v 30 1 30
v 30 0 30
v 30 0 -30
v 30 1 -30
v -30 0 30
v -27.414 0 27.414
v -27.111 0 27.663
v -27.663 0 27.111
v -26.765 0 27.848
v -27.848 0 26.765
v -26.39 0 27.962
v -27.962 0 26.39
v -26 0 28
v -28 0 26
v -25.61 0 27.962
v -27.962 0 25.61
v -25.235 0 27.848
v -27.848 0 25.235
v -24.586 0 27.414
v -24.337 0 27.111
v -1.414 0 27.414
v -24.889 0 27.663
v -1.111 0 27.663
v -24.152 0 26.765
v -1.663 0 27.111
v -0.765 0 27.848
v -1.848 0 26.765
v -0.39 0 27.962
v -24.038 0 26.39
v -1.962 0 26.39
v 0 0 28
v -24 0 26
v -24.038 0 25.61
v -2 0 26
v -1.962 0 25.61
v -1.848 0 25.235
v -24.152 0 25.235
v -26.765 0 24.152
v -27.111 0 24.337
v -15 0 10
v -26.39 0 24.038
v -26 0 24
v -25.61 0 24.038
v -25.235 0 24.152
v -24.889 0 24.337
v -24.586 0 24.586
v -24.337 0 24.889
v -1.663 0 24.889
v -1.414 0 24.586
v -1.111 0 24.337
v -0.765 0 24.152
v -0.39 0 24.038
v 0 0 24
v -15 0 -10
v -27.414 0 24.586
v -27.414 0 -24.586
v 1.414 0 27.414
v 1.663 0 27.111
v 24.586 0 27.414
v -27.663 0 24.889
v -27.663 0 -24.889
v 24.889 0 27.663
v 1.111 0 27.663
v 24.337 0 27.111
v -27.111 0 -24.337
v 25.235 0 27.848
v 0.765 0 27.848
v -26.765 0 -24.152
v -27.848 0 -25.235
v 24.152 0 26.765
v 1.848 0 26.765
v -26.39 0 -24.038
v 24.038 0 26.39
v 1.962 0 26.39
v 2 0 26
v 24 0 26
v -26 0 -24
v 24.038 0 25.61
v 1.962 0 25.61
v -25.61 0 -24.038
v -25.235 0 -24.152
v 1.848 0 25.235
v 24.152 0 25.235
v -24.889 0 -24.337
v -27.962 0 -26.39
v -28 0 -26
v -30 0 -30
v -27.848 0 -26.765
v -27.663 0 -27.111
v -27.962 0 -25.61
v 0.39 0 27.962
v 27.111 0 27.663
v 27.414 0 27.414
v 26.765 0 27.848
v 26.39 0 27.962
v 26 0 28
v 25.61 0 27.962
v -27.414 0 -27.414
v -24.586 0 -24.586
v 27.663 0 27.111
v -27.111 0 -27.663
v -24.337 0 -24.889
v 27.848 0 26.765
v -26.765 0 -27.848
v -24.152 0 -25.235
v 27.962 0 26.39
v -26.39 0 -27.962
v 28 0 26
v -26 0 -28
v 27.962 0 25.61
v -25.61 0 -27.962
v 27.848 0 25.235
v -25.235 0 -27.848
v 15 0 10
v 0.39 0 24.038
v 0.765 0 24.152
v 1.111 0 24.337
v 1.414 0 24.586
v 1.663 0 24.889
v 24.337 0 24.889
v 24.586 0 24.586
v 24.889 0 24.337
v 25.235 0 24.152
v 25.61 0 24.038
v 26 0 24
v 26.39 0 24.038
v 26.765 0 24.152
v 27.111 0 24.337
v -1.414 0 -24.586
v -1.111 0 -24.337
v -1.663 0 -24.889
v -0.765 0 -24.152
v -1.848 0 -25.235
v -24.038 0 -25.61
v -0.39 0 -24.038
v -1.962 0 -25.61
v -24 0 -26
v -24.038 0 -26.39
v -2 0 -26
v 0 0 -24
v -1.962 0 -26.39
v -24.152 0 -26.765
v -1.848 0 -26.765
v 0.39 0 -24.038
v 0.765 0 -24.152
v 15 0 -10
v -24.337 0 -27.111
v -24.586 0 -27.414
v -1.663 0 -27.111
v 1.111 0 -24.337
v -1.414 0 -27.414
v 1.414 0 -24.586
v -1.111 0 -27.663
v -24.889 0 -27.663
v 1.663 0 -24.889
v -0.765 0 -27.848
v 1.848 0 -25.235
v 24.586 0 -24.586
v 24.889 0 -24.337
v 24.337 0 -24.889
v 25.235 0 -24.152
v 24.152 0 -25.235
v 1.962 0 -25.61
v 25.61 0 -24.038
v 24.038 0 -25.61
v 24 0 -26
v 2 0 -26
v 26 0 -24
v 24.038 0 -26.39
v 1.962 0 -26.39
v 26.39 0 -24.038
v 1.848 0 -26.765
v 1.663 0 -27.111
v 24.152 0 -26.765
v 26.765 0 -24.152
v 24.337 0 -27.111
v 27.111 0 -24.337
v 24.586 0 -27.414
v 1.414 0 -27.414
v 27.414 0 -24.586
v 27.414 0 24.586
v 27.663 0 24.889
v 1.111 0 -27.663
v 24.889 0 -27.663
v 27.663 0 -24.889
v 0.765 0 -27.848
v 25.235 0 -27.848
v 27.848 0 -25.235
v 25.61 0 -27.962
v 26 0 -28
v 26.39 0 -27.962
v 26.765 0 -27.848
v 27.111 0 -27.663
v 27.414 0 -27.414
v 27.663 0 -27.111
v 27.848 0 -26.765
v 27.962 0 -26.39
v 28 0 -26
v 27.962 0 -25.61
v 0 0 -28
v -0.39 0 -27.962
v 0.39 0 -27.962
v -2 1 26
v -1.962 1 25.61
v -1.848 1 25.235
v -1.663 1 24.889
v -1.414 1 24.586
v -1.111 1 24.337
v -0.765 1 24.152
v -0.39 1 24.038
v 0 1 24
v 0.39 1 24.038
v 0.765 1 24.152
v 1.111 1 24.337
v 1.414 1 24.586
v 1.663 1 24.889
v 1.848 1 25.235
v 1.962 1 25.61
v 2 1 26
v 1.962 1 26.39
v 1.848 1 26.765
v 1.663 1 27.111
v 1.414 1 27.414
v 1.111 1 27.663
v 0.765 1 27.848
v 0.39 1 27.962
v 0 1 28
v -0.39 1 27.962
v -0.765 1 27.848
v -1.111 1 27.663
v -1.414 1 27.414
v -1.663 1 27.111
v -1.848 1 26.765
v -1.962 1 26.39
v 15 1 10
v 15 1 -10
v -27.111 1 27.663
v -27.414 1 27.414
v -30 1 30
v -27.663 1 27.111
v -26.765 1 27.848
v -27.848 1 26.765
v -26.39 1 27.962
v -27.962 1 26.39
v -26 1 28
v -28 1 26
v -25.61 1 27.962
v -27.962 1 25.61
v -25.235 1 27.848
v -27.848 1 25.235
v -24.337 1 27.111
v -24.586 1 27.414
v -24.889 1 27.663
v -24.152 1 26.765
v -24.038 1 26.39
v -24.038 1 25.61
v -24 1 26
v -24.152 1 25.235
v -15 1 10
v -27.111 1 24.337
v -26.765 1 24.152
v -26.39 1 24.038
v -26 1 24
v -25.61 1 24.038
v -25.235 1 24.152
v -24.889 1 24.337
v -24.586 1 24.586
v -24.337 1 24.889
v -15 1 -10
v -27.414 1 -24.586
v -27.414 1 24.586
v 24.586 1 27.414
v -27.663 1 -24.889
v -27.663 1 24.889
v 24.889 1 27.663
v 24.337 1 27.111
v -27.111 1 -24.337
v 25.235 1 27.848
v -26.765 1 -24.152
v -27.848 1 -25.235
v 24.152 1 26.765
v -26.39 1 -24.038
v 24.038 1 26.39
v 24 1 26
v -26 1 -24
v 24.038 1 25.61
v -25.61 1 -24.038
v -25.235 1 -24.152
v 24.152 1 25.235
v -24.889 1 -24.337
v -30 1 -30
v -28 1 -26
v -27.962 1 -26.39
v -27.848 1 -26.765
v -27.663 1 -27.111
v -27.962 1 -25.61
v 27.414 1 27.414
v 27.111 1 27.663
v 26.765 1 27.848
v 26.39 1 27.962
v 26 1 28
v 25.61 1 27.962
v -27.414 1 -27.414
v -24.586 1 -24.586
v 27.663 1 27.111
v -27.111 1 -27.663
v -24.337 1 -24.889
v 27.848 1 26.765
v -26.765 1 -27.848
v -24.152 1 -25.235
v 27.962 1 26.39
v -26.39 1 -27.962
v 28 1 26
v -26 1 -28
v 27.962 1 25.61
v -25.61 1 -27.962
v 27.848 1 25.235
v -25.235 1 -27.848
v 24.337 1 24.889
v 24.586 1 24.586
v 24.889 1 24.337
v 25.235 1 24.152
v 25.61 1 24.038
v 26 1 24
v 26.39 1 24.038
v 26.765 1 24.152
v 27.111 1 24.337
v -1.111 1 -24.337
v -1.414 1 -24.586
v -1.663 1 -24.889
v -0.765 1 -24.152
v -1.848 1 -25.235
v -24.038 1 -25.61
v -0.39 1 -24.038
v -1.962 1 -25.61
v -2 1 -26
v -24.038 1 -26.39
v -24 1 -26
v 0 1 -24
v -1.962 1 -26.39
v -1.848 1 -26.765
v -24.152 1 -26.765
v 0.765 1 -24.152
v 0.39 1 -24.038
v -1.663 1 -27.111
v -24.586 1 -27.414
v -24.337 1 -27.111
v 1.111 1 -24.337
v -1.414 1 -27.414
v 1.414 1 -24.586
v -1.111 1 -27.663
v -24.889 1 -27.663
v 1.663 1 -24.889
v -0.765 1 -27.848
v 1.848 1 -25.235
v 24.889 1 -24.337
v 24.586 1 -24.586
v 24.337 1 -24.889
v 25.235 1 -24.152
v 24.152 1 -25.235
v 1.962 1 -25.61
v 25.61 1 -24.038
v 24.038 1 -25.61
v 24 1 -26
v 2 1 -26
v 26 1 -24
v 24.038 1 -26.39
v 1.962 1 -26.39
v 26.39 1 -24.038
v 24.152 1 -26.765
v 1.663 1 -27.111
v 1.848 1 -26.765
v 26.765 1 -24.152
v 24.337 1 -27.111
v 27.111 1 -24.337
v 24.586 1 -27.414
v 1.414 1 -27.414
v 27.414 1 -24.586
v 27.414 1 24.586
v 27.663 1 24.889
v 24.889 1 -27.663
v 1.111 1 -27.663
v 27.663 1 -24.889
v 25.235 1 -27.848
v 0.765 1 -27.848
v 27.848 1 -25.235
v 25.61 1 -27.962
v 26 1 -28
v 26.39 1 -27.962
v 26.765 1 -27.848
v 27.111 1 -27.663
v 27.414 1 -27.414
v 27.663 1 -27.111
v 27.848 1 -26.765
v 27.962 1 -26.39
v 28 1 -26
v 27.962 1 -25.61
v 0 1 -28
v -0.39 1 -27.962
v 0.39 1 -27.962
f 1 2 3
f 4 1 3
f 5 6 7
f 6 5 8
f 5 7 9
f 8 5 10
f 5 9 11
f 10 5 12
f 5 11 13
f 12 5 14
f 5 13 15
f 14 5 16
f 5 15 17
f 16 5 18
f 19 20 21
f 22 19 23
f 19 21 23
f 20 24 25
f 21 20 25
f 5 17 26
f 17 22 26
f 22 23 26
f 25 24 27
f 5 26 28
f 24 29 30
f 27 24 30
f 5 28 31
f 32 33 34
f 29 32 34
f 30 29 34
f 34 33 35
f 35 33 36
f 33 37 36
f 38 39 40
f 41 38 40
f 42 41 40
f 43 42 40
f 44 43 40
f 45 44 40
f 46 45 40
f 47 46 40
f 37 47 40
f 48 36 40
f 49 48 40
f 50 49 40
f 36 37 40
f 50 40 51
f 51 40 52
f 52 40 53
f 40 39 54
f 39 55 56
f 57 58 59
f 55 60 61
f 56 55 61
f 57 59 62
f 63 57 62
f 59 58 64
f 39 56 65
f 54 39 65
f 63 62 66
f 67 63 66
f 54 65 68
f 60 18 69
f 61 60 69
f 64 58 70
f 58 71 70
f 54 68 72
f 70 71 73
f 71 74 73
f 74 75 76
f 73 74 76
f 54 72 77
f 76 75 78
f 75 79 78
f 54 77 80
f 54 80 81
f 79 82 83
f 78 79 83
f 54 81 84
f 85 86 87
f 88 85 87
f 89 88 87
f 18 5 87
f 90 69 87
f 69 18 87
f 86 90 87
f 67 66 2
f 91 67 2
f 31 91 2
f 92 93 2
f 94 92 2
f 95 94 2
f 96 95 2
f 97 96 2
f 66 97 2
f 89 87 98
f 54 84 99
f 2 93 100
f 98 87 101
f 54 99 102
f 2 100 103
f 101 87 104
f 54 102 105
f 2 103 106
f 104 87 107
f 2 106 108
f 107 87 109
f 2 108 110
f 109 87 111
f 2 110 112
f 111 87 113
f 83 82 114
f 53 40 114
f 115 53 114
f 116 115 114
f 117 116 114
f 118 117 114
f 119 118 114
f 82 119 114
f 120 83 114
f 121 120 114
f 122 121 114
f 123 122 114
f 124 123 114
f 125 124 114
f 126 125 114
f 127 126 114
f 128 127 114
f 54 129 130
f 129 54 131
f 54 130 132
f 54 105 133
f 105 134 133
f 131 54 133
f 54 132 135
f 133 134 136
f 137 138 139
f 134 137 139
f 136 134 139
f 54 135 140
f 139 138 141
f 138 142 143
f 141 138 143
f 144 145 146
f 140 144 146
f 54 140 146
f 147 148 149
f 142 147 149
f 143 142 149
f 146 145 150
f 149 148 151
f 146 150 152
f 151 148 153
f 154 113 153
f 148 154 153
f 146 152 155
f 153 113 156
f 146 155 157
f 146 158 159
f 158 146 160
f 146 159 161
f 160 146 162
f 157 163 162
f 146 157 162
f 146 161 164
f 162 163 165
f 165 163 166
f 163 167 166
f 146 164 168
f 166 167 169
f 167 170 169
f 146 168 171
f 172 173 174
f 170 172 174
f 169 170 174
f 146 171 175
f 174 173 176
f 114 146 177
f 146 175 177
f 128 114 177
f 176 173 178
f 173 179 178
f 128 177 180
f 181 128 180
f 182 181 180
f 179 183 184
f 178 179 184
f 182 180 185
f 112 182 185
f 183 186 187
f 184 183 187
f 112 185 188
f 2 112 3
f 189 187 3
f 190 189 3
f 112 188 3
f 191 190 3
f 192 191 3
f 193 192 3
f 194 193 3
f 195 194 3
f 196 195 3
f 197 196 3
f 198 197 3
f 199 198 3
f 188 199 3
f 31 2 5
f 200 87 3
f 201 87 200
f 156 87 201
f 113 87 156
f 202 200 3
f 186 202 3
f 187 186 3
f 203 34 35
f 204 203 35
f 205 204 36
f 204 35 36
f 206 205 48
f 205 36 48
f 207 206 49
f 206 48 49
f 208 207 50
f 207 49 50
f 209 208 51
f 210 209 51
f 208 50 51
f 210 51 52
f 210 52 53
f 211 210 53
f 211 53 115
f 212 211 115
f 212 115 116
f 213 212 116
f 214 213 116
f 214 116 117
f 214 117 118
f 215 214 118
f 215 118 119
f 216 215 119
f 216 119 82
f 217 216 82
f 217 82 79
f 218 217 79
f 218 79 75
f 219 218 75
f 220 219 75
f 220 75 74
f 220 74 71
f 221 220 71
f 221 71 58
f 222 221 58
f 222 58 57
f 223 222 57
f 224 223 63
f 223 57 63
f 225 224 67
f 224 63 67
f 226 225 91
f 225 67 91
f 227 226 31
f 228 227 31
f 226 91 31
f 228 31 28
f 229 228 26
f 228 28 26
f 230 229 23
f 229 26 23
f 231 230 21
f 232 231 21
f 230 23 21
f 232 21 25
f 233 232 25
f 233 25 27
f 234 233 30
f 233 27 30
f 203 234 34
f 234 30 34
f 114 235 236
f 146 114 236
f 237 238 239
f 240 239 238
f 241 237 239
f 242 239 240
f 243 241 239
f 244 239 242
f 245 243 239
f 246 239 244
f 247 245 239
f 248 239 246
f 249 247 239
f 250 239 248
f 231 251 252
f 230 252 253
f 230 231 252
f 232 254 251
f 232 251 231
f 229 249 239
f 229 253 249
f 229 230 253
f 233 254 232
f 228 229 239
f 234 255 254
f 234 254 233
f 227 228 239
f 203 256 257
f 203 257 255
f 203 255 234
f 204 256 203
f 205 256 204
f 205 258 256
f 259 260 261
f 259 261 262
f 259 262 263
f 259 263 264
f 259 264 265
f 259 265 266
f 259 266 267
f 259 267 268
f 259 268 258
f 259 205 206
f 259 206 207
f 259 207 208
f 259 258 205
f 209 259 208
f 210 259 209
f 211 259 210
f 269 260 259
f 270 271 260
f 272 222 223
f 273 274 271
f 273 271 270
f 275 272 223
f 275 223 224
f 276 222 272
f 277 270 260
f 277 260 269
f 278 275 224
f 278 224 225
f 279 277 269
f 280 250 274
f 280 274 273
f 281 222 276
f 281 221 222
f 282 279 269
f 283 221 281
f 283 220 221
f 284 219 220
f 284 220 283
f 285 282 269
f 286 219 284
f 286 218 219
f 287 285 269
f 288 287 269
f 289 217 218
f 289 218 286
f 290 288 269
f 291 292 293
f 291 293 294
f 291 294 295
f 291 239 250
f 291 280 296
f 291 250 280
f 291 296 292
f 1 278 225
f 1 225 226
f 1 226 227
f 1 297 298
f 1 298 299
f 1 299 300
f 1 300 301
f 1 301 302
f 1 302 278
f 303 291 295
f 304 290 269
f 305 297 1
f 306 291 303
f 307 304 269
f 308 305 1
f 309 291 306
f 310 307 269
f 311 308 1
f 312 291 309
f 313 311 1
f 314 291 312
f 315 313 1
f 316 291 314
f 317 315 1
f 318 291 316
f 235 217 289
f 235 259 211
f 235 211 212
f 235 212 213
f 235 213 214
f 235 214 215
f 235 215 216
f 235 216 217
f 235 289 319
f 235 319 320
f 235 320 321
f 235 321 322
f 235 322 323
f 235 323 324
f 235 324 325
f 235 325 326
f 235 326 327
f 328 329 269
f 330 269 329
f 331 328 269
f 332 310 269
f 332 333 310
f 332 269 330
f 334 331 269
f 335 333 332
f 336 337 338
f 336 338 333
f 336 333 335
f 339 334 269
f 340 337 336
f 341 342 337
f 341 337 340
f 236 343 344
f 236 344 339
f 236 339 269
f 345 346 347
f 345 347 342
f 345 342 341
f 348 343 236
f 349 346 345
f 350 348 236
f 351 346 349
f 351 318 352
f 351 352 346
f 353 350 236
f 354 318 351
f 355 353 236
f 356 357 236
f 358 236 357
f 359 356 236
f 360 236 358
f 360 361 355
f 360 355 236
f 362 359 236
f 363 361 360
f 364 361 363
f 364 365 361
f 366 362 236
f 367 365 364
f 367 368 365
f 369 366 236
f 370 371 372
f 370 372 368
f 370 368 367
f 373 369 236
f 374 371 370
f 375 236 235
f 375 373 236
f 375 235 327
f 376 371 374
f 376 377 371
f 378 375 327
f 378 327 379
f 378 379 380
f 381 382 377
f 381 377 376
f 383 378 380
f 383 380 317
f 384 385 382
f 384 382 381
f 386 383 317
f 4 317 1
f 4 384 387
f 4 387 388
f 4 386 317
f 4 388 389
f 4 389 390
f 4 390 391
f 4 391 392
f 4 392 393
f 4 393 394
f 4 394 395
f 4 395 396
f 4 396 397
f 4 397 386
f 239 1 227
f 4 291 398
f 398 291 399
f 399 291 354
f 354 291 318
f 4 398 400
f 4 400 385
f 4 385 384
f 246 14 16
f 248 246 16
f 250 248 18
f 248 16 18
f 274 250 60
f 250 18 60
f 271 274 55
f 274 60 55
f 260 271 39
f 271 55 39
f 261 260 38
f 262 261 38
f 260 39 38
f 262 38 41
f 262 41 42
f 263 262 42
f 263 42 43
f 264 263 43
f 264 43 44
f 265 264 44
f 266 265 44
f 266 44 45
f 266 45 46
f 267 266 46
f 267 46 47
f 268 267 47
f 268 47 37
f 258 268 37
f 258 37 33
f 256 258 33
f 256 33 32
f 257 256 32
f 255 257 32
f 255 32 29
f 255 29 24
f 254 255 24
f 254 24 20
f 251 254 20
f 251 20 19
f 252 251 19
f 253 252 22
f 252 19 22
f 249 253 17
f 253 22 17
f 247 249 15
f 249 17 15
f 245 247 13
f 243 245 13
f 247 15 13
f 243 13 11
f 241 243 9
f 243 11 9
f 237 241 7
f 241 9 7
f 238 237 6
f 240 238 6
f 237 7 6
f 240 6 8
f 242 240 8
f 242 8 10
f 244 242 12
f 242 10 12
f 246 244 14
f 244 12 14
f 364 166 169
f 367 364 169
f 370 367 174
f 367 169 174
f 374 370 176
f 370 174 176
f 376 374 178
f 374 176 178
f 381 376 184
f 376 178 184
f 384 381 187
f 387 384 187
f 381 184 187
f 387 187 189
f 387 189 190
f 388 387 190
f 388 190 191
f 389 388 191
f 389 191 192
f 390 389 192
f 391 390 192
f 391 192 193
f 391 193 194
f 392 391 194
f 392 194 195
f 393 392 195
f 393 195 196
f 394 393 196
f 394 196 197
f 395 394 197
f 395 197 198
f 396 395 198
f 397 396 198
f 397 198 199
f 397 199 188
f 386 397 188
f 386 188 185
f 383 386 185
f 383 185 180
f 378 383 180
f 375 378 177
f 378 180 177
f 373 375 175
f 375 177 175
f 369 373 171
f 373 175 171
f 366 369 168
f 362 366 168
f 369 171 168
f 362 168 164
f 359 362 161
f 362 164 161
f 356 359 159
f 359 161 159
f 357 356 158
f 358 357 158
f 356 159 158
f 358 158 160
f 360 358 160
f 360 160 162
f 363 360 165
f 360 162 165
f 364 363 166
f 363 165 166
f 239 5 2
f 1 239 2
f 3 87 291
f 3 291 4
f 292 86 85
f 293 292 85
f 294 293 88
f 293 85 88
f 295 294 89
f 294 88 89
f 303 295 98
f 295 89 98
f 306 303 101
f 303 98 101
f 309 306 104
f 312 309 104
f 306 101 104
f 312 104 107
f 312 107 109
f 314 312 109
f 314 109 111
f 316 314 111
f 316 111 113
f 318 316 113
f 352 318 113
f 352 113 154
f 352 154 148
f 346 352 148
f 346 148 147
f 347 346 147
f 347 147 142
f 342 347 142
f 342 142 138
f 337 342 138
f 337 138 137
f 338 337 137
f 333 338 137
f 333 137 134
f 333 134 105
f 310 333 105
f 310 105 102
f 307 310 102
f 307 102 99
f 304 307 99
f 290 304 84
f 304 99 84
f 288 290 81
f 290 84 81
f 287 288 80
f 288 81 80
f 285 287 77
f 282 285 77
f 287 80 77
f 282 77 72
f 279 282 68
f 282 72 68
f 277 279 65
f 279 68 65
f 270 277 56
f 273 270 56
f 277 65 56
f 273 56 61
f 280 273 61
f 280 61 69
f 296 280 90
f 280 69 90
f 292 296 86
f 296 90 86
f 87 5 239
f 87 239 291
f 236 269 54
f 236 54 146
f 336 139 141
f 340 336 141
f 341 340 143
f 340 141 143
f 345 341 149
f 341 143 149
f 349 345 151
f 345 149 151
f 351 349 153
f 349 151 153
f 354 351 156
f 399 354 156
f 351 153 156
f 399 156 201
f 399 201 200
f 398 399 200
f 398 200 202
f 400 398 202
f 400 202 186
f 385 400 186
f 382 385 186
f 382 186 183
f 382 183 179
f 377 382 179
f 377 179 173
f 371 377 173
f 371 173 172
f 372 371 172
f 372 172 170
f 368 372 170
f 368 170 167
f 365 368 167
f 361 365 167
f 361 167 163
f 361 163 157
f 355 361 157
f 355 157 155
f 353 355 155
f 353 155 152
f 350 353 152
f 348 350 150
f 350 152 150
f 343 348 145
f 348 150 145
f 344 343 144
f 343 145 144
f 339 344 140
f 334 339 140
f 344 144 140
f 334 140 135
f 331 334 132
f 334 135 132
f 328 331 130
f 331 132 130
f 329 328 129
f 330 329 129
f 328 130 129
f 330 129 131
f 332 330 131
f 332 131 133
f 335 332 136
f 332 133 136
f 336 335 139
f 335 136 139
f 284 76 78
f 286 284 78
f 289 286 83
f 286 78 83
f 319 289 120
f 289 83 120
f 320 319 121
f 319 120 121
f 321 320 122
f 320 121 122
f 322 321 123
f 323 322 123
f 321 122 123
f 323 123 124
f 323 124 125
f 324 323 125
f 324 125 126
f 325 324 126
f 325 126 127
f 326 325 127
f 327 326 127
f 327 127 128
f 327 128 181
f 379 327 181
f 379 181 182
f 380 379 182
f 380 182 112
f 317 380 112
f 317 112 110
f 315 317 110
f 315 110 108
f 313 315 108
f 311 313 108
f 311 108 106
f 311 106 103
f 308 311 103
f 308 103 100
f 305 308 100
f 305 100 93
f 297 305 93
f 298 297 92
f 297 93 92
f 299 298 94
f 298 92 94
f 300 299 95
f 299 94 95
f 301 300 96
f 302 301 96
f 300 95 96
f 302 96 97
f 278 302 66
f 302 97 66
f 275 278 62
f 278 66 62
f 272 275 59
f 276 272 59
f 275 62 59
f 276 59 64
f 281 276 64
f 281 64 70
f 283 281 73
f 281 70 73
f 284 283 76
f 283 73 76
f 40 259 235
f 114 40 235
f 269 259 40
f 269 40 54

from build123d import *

# Parameters (mm, degrees)
SKETCH1_W                    = 60
SKETCH1_H                    = 60
BOSS_EXTRUDE1_DEPTH          = 1
F_4_0_4_DIAMETER_HOLE1_D     = 4
F_4_0_4_DIAMETER_HOLE1_DEPTH = 1
SKETCH14_W                   = 30
SKETCH14_H                   = 20
CUT_EXTRUDE1_DEPTH           = 10


with BuildPart() as part:
    # Sketch1 → Boss-Extrude1 (new body)
    with BuildSketch(Plane(origin=(0, 0, 0), x_dir=(1, 0, 0), z_dir=(0, 1, 0))):
        Rectangle(SKETCH1_W, SKETCH1_H)
    extrude(amount=BOSS_EXTRUDE1_DEPTH)

    # Ø4.0 (4) Diameter Hole1
    with Locations(Plane(origin=(0, 1, 0), x_dir=(1, 0, 0), z_dir=(0, 1, 0))):
        with Locations((26, 26), (0, 26), (-26, 26), (0, -26), (26, -26), (-26, -26)):
            Hole(F_4_0_4_DIAMETER_HOLE1_D / 2, depth=F_4_0_4_DIAMETER_HOLE1_DEPTH)

    # Sketch14 → Cut-Extrude1 (cut)
    with BuildSketch(Plane(origin=(0, 1, 0), x_dir=(1, 0, 0), z_dir=(0, 1, 0))):
        Rectangle(SKETCH14_W, SKETCH14_H)
    extrude(amount=-CUT_EXTRUDE1_DEPTH, mode=Mode.SUBTRACT)


solid = part.part
